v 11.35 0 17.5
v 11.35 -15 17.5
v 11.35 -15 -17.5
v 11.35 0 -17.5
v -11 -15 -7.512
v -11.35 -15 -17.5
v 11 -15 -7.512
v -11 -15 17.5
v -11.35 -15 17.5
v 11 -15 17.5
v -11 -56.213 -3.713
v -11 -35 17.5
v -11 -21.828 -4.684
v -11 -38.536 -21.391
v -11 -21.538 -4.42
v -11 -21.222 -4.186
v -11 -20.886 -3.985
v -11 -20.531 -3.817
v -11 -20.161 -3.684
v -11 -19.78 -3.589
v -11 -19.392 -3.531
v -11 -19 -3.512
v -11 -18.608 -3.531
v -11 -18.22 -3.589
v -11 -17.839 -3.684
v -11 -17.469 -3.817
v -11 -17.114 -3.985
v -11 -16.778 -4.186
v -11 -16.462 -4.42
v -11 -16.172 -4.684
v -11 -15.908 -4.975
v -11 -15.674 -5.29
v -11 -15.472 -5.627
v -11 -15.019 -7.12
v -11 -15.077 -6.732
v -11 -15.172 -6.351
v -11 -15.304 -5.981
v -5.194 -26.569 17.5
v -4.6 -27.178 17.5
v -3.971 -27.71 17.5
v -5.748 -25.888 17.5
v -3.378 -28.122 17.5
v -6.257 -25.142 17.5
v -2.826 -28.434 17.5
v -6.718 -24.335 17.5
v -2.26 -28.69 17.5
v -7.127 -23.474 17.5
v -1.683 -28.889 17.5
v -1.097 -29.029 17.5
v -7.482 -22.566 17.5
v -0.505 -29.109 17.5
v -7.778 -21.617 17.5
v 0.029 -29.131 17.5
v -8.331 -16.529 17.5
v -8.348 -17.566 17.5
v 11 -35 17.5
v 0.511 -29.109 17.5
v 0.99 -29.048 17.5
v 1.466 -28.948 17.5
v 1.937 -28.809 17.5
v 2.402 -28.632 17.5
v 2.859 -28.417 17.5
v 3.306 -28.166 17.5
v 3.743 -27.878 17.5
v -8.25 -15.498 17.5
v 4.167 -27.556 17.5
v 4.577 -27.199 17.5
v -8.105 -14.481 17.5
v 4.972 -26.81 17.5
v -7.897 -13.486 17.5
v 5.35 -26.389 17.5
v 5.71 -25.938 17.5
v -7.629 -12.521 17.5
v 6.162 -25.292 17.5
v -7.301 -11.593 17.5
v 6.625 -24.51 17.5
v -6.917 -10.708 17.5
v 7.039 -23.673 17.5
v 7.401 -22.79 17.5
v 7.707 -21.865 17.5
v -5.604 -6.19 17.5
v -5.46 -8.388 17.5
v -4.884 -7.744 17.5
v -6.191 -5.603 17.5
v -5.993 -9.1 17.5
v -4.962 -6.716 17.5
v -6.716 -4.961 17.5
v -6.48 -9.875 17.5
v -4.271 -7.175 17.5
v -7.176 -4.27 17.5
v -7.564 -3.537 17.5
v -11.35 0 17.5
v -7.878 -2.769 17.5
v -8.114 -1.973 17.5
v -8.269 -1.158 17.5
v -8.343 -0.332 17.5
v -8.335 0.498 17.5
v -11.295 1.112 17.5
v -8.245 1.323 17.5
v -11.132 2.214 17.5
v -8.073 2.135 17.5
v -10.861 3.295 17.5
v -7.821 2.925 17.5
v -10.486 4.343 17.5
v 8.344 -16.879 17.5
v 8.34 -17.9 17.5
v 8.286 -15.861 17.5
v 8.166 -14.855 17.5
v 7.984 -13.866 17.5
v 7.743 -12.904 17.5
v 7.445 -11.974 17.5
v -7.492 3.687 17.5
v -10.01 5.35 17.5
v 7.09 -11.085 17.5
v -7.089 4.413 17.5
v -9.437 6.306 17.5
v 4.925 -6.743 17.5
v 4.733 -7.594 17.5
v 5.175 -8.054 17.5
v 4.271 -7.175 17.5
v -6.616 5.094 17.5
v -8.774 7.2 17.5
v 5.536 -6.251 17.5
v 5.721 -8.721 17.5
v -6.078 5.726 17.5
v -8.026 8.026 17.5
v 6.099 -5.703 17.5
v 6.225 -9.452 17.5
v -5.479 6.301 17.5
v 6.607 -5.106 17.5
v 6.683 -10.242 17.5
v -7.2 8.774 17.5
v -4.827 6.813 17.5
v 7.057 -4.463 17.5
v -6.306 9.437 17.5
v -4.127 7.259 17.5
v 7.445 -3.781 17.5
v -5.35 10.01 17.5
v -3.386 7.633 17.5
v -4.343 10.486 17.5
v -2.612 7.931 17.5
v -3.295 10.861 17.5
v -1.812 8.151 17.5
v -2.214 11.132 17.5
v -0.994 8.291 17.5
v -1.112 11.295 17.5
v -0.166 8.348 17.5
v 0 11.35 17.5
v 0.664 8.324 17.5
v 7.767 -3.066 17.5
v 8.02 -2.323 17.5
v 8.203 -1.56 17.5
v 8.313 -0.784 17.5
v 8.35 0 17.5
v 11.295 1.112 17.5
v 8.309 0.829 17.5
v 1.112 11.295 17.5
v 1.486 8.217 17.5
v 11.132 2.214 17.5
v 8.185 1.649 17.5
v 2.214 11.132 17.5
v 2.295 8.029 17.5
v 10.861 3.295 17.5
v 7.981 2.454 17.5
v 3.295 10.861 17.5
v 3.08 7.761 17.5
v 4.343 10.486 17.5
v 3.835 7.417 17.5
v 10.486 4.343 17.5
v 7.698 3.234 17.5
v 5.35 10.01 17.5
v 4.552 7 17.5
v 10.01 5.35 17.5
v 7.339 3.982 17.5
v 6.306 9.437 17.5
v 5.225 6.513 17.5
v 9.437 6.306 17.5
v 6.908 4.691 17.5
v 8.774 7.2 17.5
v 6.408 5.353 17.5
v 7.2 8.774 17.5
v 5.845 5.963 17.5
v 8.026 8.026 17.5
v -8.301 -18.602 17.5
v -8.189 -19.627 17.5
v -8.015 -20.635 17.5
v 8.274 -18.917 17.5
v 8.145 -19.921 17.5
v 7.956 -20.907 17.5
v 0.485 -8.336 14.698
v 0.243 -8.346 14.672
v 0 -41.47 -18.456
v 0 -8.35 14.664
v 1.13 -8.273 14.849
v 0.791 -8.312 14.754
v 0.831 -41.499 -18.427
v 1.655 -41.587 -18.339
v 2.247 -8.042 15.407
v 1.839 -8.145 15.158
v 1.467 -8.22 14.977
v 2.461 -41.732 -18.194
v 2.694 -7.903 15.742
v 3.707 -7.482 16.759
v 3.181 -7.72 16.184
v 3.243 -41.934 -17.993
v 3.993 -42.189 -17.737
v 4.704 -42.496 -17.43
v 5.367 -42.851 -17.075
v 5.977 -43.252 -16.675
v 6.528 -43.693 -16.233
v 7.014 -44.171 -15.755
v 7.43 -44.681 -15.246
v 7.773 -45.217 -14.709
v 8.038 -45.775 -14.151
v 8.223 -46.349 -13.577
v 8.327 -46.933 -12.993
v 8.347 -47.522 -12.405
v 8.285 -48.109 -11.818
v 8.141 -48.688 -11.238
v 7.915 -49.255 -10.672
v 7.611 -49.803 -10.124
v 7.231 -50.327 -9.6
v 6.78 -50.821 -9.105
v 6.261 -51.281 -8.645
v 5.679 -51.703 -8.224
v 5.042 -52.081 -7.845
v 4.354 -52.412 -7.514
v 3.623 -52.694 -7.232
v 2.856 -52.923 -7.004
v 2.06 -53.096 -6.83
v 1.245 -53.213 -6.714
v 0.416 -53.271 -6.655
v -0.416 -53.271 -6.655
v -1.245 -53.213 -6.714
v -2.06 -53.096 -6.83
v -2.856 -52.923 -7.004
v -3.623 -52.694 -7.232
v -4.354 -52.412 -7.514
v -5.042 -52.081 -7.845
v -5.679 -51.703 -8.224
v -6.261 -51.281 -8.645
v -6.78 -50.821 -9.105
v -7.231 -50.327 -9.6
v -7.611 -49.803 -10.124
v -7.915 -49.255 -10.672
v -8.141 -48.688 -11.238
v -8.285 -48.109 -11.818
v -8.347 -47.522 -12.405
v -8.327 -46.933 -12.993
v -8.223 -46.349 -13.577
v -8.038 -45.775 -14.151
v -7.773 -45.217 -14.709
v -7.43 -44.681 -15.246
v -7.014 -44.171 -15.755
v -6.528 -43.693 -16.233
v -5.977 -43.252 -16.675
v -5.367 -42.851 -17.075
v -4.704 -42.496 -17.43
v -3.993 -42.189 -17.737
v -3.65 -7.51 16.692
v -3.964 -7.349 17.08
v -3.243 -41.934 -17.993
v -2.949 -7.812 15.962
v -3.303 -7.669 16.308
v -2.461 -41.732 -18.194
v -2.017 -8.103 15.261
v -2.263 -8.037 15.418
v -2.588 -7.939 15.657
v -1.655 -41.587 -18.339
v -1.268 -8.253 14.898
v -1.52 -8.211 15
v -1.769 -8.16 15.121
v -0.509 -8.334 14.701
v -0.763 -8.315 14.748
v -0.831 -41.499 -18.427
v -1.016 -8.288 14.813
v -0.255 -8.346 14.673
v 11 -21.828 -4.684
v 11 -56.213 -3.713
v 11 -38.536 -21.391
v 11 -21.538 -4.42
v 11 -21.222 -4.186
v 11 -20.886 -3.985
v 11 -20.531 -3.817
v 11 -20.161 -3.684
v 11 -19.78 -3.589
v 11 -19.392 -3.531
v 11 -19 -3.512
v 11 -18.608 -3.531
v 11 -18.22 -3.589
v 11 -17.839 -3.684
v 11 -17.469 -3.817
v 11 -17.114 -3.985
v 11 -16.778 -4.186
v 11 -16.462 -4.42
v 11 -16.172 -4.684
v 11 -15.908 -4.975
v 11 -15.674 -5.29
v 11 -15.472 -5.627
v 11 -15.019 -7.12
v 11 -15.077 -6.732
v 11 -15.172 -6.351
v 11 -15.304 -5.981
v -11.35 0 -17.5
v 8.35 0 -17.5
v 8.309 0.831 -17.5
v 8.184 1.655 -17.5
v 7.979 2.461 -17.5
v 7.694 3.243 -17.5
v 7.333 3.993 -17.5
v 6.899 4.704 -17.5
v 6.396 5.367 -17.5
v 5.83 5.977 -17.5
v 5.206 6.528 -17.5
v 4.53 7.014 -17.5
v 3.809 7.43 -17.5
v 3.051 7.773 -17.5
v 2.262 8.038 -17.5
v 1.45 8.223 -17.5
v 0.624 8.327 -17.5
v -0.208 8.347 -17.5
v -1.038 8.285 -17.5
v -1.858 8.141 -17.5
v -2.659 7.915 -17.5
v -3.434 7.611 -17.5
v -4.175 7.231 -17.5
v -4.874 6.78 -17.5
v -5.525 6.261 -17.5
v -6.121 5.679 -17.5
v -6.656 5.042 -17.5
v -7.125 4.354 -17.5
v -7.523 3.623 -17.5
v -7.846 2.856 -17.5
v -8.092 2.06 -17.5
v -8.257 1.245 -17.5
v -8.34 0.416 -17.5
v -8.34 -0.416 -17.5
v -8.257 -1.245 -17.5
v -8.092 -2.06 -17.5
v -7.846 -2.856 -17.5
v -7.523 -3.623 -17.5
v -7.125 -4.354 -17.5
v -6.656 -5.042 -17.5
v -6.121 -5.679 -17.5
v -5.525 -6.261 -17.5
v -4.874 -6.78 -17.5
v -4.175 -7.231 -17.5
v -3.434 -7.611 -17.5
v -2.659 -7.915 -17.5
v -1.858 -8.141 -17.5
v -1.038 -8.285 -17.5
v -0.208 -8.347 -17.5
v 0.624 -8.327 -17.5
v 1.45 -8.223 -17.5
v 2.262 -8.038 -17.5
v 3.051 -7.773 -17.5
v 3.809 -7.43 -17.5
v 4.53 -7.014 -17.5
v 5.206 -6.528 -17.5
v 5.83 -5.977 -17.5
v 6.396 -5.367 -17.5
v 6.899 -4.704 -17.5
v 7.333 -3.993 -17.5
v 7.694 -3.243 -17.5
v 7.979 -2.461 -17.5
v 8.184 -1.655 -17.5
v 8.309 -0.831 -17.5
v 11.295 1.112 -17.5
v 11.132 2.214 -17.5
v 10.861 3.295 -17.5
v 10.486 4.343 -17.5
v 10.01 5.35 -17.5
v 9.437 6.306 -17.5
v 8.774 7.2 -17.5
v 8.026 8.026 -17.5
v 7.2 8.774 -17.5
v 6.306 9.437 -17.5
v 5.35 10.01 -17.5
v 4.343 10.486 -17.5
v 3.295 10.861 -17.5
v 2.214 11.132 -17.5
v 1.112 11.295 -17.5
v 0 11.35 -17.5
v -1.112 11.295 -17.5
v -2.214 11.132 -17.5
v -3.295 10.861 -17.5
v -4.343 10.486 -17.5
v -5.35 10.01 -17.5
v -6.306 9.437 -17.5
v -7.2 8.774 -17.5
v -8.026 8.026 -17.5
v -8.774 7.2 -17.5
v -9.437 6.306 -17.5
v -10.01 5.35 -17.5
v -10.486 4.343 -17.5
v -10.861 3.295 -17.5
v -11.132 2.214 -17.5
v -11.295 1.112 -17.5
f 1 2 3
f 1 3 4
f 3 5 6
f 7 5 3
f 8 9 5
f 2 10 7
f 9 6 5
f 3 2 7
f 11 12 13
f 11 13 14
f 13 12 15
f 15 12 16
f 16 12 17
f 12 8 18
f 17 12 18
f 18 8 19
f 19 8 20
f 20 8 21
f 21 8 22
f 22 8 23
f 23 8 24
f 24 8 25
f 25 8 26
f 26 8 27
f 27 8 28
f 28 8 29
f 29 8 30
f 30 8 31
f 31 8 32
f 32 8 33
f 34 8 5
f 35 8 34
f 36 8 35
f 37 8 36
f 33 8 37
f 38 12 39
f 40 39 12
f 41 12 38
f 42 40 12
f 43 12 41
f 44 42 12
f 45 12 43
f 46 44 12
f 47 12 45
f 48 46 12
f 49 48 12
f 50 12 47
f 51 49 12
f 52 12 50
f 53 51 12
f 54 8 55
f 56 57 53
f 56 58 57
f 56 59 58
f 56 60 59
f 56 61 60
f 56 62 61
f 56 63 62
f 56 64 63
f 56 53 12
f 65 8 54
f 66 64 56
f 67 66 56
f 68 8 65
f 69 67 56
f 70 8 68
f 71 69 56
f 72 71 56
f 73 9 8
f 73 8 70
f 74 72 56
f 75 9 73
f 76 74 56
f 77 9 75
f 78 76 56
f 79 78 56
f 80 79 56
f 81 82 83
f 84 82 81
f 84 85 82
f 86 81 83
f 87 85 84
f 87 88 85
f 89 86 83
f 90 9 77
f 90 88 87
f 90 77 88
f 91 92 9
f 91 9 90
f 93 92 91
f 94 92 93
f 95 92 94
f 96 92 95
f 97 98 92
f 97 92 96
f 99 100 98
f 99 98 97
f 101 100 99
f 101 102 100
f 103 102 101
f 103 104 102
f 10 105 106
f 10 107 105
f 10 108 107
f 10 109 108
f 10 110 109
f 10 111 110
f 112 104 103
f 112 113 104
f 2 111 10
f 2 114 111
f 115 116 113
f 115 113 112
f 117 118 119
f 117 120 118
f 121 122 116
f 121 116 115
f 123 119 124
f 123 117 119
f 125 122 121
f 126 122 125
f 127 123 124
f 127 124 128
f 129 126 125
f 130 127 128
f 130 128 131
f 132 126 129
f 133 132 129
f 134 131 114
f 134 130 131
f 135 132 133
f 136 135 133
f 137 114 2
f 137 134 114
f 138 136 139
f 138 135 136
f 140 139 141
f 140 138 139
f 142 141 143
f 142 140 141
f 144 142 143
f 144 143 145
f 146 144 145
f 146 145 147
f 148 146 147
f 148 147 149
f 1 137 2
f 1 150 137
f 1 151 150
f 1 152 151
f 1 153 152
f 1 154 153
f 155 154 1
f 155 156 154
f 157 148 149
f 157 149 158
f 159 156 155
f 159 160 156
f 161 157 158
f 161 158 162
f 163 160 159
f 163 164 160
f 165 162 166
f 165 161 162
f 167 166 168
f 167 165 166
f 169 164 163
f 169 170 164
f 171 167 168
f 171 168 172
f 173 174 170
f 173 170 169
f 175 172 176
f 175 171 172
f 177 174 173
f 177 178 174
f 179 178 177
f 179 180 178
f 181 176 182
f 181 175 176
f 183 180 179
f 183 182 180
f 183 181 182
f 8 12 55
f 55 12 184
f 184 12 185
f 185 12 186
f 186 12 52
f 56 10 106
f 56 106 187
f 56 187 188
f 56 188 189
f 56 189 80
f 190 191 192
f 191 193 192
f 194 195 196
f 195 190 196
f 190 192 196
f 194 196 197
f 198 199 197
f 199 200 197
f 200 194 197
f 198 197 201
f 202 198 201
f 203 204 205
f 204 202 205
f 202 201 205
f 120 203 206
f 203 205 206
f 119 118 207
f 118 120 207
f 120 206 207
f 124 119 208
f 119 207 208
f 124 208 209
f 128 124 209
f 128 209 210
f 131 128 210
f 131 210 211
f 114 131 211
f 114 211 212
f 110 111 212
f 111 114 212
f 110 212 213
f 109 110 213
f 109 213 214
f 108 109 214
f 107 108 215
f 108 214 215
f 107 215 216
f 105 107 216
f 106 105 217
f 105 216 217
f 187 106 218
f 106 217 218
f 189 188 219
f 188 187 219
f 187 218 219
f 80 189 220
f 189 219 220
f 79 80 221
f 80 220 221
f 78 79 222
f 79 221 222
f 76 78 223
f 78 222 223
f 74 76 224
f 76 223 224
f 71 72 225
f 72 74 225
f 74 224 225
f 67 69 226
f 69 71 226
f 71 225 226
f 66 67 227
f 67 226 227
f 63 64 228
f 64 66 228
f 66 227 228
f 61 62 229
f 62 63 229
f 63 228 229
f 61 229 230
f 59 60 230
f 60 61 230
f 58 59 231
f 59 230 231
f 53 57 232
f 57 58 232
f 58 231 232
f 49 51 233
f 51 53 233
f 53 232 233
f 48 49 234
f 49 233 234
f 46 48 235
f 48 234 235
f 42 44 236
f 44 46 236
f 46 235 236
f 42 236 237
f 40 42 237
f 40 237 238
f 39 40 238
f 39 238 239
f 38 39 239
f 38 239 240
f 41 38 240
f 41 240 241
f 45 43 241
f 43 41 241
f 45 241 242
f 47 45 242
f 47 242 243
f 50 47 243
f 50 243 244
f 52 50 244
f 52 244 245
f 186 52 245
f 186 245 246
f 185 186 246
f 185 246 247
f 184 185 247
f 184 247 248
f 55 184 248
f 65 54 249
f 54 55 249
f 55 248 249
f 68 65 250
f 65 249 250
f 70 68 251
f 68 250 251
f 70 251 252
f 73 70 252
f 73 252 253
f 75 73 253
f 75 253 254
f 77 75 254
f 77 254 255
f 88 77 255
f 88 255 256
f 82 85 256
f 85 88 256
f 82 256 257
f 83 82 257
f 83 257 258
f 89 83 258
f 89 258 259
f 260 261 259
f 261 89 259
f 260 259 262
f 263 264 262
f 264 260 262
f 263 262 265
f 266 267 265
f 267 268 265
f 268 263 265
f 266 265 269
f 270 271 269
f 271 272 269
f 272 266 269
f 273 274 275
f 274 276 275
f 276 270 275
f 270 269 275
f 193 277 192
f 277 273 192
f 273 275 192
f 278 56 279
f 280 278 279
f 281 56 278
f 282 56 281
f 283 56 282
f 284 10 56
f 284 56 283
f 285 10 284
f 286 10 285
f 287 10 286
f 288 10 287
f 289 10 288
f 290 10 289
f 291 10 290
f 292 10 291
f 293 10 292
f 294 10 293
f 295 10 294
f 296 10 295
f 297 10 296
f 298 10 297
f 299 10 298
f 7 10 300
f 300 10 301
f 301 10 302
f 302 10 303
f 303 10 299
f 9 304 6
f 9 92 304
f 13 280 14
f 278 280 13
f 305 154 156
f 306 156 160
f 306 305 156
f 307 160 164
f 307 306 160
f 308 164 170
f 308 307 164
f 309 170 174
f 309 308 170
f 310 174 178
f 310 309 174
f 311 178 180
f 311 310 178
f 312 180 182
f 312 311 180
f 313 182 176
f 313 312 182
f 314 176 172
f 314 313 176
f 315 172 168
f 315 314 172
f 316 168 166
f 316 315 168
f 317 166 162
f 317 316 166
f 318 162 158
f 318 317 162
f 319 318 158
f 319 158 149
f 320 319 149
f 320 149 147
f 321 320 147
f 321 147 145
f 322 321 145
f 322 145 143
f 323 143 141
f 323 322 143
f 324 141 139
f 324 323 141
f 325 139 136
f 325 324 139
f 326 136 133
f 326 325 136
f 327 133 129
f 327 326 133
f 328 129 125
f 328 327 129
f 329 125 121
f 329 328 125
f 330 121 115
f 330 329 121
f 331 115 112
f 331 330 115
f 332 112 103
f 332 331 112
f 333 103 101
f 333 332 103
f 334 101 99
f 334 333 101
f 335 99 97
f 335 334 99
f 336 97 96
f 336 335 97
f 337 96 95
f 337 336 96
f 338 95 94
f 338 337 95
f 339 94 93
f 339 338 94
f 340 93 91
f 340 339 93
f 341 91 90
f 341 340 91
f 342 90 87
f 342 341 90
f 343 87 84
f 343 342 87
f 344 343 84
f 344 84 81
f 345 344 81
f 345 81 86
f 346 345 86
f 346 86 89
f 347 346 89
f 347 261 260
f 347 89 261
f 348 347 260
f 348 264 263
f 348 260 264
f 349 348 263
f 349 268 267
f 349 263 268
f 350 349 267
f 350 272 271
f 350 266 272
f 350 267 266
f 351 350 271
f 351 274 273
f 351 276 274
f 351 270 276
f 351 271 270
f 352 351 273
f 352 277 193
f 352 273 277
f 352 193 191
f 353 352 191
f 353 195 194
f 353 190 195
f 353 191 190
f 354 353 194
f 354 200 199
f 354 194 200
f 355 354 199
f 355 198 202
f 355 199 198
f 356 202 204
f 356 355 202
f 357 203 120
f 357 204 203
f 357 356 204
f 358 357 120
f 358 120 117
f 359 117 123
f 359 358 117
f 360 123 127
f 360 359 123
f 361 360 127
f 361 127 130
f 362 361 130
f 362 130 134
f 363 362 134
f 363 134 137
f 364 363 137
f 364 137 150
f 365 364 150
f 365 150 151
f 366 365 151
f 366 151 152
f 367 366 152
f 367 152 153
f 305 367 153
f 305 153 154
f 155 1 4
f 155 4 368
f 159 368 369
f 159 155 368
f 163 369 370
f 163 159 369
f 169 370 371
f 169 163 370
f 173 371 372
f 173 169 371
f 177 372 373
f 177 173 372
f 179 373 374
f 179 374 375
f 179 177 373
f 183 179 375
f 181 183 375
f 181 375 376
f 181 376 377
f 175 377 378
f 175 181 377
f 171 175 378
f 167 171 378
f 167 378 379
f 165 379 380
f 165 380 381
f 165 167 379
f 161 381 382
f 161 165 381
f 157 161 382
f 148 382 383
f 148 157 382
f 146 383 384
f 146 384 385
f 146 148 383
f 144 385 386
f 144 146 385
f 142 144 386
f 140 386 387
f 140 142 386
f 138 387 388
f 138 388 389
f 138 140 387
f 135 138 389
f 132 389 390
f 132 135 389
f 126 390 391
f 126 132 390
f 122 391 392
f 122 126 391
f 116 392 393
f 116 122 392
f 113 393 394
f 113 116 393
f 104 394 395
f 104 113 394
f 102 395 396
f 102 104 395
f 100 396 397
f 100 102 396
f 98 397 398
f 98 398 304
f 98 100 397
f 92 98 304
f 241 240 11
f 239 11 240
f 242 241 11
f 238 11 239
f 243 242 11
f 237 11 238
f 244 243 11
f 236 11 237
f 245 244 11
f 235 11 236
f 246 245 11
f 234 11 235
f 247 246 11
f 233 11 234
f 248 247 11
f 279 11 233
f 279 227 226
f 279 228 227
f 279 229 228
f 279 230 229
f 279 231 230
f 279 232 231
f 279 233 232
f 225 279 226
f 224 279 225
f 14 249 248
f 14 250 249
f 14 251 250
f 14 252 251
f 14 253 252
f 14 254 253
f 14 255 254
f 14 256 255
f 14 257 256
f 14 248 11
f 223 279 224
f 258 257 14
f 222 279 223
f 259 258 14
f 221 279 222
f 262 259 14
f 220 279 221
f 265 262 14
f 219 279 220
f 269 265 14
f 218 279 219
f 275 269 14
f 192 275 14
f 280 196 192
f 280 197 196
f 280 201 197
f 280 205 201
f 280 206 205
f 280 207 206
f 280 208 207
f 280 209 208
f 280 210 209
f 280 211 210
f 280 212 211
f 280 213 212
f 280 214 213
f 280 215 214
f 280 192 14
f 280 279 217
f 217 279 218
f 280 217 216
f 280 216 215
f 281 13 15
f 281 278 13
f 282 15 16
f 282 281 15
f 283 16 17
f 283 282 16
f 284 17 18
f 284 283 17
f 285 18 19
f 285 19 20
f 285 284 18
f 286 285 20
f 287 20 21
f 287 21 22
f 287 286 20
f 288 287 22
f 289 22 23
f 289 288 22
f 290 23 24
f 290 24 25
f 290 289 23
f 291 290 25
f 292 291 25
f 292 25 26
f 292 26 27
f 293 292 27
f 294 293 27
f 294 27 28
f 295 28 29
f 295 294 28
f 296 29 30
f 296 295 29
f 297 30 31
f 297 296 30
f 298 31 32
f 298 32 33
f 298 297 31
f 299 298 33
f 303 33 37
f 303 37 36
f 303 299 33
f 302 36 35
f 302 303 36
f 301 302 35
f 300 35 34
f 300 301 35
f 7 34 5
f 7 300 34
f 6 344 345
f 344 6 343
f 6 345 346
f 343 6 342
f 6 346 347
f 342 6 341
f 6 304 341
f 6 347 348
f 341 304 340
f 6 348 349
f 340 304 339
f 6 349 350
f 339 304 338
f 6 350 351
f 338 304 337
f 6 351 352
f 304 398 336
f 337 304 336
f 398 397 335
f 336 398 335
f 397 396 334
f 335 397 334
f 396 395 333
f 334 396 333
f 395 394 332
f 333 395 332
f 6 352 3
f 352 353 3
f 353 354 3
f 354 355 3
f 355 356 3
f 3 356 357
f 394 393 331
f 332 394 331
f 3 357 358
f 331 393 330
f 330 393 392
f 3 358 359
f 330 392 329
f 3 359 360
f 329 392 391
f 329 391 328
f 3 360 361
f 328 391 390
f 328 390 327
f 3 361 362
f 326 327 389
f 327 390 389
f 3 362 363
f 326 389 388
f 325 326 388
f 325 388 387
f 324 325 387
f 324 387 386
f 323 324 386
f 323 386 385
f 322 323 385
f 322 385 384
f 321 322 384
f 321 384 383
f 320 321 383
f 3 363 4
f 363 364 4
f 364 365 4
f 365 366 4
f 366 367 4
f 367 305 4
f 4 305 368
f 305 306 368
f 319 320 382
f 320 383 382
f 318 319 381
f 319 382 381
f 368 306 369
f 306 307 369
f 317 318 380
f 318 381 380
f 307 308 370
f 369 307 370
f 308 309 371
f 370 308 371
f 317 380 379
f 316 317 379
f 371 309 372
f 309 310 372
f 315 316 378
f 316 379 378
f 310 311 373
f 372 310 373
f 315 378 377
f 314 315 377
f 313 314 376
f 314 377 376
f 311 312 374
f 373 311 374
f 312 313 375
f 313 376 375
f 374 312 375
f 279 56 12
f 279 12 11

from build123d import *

# Parameters (mm, degrees)
CROQUIS1_R              = 8.35
SALIENTE_EXTRUIR1_DEPTH = 17.5
SALIENTE_EXTRUIR2_DEPTH = 11
CROQUIS4_R              = 8.35
CORTAR_EXTRUIR1_DEPTH   = 55


with BuildPart() as part:
    # Croquis1 → Saliente-Extruir1 (new, symmetric)
    with BuildSketch(Plane.XY):
        with BuildLine():
            Line((-11.35, -15), (11.35, -15))
            Line((11.35, -15), (11.35, 0))
            ThreePointArc((11.35, 0), (0, 11.35), (-11.35, 0))
            Line((-11.35, 0), (-11.35, -15))
        make_face()
        Circle(CROQUIS1_R, mode=Mode.SUBTRACT)
    extrude(amount=SALIENTE_EXTRUIR1_DEPTH, both=True)

    # Croquis2 → Saliente-Extruir2 (add, symmetric)
    with BuildSketch(Plane(origin=(0, 0, 0), x_dir=(0, 0, -1), z_dir=(1, 0, 0))):
        with BuildLine():
            Line((-17.5, -15), (-17.5, -35))
            Line((-17.5, -35), (3.713203436, -56.213203436))
            Line((3.713203436, -56.213203436), (21.390872965, -38.535533906))
            Line((21.390872965, -38.535533906), (4.683766184, -21.828427125))
            ThreePointArc((4.683766184, -21.828427125), (3.816675179, -17.469266271), (7.512193309, -15))
            Line((7.512193309, -15), (-17.5, -15))
        make_face()
    extrude(amount=SALIENTE_EXTRUIR2_DEPTH, both=True)

    # Croquis4 → Cortar-Extruir1 (cut)
    with BuildSketch(Plane(origin=(0, -29.963203436, -29.963203436), x_dir=(-1, 0, 0), z_dir=(0, -0.7071067811865459, -0.7071067811865492))):
        with Locations(Location((0, -24.623106012, 0), (0, 0, 90))):
            Circle(CROQUIS4_R)
    extrude(amount=-CORTAR_EXTRUIR1_DEPTH, mode=Mode.SUBTRACT)


solid = part.part
